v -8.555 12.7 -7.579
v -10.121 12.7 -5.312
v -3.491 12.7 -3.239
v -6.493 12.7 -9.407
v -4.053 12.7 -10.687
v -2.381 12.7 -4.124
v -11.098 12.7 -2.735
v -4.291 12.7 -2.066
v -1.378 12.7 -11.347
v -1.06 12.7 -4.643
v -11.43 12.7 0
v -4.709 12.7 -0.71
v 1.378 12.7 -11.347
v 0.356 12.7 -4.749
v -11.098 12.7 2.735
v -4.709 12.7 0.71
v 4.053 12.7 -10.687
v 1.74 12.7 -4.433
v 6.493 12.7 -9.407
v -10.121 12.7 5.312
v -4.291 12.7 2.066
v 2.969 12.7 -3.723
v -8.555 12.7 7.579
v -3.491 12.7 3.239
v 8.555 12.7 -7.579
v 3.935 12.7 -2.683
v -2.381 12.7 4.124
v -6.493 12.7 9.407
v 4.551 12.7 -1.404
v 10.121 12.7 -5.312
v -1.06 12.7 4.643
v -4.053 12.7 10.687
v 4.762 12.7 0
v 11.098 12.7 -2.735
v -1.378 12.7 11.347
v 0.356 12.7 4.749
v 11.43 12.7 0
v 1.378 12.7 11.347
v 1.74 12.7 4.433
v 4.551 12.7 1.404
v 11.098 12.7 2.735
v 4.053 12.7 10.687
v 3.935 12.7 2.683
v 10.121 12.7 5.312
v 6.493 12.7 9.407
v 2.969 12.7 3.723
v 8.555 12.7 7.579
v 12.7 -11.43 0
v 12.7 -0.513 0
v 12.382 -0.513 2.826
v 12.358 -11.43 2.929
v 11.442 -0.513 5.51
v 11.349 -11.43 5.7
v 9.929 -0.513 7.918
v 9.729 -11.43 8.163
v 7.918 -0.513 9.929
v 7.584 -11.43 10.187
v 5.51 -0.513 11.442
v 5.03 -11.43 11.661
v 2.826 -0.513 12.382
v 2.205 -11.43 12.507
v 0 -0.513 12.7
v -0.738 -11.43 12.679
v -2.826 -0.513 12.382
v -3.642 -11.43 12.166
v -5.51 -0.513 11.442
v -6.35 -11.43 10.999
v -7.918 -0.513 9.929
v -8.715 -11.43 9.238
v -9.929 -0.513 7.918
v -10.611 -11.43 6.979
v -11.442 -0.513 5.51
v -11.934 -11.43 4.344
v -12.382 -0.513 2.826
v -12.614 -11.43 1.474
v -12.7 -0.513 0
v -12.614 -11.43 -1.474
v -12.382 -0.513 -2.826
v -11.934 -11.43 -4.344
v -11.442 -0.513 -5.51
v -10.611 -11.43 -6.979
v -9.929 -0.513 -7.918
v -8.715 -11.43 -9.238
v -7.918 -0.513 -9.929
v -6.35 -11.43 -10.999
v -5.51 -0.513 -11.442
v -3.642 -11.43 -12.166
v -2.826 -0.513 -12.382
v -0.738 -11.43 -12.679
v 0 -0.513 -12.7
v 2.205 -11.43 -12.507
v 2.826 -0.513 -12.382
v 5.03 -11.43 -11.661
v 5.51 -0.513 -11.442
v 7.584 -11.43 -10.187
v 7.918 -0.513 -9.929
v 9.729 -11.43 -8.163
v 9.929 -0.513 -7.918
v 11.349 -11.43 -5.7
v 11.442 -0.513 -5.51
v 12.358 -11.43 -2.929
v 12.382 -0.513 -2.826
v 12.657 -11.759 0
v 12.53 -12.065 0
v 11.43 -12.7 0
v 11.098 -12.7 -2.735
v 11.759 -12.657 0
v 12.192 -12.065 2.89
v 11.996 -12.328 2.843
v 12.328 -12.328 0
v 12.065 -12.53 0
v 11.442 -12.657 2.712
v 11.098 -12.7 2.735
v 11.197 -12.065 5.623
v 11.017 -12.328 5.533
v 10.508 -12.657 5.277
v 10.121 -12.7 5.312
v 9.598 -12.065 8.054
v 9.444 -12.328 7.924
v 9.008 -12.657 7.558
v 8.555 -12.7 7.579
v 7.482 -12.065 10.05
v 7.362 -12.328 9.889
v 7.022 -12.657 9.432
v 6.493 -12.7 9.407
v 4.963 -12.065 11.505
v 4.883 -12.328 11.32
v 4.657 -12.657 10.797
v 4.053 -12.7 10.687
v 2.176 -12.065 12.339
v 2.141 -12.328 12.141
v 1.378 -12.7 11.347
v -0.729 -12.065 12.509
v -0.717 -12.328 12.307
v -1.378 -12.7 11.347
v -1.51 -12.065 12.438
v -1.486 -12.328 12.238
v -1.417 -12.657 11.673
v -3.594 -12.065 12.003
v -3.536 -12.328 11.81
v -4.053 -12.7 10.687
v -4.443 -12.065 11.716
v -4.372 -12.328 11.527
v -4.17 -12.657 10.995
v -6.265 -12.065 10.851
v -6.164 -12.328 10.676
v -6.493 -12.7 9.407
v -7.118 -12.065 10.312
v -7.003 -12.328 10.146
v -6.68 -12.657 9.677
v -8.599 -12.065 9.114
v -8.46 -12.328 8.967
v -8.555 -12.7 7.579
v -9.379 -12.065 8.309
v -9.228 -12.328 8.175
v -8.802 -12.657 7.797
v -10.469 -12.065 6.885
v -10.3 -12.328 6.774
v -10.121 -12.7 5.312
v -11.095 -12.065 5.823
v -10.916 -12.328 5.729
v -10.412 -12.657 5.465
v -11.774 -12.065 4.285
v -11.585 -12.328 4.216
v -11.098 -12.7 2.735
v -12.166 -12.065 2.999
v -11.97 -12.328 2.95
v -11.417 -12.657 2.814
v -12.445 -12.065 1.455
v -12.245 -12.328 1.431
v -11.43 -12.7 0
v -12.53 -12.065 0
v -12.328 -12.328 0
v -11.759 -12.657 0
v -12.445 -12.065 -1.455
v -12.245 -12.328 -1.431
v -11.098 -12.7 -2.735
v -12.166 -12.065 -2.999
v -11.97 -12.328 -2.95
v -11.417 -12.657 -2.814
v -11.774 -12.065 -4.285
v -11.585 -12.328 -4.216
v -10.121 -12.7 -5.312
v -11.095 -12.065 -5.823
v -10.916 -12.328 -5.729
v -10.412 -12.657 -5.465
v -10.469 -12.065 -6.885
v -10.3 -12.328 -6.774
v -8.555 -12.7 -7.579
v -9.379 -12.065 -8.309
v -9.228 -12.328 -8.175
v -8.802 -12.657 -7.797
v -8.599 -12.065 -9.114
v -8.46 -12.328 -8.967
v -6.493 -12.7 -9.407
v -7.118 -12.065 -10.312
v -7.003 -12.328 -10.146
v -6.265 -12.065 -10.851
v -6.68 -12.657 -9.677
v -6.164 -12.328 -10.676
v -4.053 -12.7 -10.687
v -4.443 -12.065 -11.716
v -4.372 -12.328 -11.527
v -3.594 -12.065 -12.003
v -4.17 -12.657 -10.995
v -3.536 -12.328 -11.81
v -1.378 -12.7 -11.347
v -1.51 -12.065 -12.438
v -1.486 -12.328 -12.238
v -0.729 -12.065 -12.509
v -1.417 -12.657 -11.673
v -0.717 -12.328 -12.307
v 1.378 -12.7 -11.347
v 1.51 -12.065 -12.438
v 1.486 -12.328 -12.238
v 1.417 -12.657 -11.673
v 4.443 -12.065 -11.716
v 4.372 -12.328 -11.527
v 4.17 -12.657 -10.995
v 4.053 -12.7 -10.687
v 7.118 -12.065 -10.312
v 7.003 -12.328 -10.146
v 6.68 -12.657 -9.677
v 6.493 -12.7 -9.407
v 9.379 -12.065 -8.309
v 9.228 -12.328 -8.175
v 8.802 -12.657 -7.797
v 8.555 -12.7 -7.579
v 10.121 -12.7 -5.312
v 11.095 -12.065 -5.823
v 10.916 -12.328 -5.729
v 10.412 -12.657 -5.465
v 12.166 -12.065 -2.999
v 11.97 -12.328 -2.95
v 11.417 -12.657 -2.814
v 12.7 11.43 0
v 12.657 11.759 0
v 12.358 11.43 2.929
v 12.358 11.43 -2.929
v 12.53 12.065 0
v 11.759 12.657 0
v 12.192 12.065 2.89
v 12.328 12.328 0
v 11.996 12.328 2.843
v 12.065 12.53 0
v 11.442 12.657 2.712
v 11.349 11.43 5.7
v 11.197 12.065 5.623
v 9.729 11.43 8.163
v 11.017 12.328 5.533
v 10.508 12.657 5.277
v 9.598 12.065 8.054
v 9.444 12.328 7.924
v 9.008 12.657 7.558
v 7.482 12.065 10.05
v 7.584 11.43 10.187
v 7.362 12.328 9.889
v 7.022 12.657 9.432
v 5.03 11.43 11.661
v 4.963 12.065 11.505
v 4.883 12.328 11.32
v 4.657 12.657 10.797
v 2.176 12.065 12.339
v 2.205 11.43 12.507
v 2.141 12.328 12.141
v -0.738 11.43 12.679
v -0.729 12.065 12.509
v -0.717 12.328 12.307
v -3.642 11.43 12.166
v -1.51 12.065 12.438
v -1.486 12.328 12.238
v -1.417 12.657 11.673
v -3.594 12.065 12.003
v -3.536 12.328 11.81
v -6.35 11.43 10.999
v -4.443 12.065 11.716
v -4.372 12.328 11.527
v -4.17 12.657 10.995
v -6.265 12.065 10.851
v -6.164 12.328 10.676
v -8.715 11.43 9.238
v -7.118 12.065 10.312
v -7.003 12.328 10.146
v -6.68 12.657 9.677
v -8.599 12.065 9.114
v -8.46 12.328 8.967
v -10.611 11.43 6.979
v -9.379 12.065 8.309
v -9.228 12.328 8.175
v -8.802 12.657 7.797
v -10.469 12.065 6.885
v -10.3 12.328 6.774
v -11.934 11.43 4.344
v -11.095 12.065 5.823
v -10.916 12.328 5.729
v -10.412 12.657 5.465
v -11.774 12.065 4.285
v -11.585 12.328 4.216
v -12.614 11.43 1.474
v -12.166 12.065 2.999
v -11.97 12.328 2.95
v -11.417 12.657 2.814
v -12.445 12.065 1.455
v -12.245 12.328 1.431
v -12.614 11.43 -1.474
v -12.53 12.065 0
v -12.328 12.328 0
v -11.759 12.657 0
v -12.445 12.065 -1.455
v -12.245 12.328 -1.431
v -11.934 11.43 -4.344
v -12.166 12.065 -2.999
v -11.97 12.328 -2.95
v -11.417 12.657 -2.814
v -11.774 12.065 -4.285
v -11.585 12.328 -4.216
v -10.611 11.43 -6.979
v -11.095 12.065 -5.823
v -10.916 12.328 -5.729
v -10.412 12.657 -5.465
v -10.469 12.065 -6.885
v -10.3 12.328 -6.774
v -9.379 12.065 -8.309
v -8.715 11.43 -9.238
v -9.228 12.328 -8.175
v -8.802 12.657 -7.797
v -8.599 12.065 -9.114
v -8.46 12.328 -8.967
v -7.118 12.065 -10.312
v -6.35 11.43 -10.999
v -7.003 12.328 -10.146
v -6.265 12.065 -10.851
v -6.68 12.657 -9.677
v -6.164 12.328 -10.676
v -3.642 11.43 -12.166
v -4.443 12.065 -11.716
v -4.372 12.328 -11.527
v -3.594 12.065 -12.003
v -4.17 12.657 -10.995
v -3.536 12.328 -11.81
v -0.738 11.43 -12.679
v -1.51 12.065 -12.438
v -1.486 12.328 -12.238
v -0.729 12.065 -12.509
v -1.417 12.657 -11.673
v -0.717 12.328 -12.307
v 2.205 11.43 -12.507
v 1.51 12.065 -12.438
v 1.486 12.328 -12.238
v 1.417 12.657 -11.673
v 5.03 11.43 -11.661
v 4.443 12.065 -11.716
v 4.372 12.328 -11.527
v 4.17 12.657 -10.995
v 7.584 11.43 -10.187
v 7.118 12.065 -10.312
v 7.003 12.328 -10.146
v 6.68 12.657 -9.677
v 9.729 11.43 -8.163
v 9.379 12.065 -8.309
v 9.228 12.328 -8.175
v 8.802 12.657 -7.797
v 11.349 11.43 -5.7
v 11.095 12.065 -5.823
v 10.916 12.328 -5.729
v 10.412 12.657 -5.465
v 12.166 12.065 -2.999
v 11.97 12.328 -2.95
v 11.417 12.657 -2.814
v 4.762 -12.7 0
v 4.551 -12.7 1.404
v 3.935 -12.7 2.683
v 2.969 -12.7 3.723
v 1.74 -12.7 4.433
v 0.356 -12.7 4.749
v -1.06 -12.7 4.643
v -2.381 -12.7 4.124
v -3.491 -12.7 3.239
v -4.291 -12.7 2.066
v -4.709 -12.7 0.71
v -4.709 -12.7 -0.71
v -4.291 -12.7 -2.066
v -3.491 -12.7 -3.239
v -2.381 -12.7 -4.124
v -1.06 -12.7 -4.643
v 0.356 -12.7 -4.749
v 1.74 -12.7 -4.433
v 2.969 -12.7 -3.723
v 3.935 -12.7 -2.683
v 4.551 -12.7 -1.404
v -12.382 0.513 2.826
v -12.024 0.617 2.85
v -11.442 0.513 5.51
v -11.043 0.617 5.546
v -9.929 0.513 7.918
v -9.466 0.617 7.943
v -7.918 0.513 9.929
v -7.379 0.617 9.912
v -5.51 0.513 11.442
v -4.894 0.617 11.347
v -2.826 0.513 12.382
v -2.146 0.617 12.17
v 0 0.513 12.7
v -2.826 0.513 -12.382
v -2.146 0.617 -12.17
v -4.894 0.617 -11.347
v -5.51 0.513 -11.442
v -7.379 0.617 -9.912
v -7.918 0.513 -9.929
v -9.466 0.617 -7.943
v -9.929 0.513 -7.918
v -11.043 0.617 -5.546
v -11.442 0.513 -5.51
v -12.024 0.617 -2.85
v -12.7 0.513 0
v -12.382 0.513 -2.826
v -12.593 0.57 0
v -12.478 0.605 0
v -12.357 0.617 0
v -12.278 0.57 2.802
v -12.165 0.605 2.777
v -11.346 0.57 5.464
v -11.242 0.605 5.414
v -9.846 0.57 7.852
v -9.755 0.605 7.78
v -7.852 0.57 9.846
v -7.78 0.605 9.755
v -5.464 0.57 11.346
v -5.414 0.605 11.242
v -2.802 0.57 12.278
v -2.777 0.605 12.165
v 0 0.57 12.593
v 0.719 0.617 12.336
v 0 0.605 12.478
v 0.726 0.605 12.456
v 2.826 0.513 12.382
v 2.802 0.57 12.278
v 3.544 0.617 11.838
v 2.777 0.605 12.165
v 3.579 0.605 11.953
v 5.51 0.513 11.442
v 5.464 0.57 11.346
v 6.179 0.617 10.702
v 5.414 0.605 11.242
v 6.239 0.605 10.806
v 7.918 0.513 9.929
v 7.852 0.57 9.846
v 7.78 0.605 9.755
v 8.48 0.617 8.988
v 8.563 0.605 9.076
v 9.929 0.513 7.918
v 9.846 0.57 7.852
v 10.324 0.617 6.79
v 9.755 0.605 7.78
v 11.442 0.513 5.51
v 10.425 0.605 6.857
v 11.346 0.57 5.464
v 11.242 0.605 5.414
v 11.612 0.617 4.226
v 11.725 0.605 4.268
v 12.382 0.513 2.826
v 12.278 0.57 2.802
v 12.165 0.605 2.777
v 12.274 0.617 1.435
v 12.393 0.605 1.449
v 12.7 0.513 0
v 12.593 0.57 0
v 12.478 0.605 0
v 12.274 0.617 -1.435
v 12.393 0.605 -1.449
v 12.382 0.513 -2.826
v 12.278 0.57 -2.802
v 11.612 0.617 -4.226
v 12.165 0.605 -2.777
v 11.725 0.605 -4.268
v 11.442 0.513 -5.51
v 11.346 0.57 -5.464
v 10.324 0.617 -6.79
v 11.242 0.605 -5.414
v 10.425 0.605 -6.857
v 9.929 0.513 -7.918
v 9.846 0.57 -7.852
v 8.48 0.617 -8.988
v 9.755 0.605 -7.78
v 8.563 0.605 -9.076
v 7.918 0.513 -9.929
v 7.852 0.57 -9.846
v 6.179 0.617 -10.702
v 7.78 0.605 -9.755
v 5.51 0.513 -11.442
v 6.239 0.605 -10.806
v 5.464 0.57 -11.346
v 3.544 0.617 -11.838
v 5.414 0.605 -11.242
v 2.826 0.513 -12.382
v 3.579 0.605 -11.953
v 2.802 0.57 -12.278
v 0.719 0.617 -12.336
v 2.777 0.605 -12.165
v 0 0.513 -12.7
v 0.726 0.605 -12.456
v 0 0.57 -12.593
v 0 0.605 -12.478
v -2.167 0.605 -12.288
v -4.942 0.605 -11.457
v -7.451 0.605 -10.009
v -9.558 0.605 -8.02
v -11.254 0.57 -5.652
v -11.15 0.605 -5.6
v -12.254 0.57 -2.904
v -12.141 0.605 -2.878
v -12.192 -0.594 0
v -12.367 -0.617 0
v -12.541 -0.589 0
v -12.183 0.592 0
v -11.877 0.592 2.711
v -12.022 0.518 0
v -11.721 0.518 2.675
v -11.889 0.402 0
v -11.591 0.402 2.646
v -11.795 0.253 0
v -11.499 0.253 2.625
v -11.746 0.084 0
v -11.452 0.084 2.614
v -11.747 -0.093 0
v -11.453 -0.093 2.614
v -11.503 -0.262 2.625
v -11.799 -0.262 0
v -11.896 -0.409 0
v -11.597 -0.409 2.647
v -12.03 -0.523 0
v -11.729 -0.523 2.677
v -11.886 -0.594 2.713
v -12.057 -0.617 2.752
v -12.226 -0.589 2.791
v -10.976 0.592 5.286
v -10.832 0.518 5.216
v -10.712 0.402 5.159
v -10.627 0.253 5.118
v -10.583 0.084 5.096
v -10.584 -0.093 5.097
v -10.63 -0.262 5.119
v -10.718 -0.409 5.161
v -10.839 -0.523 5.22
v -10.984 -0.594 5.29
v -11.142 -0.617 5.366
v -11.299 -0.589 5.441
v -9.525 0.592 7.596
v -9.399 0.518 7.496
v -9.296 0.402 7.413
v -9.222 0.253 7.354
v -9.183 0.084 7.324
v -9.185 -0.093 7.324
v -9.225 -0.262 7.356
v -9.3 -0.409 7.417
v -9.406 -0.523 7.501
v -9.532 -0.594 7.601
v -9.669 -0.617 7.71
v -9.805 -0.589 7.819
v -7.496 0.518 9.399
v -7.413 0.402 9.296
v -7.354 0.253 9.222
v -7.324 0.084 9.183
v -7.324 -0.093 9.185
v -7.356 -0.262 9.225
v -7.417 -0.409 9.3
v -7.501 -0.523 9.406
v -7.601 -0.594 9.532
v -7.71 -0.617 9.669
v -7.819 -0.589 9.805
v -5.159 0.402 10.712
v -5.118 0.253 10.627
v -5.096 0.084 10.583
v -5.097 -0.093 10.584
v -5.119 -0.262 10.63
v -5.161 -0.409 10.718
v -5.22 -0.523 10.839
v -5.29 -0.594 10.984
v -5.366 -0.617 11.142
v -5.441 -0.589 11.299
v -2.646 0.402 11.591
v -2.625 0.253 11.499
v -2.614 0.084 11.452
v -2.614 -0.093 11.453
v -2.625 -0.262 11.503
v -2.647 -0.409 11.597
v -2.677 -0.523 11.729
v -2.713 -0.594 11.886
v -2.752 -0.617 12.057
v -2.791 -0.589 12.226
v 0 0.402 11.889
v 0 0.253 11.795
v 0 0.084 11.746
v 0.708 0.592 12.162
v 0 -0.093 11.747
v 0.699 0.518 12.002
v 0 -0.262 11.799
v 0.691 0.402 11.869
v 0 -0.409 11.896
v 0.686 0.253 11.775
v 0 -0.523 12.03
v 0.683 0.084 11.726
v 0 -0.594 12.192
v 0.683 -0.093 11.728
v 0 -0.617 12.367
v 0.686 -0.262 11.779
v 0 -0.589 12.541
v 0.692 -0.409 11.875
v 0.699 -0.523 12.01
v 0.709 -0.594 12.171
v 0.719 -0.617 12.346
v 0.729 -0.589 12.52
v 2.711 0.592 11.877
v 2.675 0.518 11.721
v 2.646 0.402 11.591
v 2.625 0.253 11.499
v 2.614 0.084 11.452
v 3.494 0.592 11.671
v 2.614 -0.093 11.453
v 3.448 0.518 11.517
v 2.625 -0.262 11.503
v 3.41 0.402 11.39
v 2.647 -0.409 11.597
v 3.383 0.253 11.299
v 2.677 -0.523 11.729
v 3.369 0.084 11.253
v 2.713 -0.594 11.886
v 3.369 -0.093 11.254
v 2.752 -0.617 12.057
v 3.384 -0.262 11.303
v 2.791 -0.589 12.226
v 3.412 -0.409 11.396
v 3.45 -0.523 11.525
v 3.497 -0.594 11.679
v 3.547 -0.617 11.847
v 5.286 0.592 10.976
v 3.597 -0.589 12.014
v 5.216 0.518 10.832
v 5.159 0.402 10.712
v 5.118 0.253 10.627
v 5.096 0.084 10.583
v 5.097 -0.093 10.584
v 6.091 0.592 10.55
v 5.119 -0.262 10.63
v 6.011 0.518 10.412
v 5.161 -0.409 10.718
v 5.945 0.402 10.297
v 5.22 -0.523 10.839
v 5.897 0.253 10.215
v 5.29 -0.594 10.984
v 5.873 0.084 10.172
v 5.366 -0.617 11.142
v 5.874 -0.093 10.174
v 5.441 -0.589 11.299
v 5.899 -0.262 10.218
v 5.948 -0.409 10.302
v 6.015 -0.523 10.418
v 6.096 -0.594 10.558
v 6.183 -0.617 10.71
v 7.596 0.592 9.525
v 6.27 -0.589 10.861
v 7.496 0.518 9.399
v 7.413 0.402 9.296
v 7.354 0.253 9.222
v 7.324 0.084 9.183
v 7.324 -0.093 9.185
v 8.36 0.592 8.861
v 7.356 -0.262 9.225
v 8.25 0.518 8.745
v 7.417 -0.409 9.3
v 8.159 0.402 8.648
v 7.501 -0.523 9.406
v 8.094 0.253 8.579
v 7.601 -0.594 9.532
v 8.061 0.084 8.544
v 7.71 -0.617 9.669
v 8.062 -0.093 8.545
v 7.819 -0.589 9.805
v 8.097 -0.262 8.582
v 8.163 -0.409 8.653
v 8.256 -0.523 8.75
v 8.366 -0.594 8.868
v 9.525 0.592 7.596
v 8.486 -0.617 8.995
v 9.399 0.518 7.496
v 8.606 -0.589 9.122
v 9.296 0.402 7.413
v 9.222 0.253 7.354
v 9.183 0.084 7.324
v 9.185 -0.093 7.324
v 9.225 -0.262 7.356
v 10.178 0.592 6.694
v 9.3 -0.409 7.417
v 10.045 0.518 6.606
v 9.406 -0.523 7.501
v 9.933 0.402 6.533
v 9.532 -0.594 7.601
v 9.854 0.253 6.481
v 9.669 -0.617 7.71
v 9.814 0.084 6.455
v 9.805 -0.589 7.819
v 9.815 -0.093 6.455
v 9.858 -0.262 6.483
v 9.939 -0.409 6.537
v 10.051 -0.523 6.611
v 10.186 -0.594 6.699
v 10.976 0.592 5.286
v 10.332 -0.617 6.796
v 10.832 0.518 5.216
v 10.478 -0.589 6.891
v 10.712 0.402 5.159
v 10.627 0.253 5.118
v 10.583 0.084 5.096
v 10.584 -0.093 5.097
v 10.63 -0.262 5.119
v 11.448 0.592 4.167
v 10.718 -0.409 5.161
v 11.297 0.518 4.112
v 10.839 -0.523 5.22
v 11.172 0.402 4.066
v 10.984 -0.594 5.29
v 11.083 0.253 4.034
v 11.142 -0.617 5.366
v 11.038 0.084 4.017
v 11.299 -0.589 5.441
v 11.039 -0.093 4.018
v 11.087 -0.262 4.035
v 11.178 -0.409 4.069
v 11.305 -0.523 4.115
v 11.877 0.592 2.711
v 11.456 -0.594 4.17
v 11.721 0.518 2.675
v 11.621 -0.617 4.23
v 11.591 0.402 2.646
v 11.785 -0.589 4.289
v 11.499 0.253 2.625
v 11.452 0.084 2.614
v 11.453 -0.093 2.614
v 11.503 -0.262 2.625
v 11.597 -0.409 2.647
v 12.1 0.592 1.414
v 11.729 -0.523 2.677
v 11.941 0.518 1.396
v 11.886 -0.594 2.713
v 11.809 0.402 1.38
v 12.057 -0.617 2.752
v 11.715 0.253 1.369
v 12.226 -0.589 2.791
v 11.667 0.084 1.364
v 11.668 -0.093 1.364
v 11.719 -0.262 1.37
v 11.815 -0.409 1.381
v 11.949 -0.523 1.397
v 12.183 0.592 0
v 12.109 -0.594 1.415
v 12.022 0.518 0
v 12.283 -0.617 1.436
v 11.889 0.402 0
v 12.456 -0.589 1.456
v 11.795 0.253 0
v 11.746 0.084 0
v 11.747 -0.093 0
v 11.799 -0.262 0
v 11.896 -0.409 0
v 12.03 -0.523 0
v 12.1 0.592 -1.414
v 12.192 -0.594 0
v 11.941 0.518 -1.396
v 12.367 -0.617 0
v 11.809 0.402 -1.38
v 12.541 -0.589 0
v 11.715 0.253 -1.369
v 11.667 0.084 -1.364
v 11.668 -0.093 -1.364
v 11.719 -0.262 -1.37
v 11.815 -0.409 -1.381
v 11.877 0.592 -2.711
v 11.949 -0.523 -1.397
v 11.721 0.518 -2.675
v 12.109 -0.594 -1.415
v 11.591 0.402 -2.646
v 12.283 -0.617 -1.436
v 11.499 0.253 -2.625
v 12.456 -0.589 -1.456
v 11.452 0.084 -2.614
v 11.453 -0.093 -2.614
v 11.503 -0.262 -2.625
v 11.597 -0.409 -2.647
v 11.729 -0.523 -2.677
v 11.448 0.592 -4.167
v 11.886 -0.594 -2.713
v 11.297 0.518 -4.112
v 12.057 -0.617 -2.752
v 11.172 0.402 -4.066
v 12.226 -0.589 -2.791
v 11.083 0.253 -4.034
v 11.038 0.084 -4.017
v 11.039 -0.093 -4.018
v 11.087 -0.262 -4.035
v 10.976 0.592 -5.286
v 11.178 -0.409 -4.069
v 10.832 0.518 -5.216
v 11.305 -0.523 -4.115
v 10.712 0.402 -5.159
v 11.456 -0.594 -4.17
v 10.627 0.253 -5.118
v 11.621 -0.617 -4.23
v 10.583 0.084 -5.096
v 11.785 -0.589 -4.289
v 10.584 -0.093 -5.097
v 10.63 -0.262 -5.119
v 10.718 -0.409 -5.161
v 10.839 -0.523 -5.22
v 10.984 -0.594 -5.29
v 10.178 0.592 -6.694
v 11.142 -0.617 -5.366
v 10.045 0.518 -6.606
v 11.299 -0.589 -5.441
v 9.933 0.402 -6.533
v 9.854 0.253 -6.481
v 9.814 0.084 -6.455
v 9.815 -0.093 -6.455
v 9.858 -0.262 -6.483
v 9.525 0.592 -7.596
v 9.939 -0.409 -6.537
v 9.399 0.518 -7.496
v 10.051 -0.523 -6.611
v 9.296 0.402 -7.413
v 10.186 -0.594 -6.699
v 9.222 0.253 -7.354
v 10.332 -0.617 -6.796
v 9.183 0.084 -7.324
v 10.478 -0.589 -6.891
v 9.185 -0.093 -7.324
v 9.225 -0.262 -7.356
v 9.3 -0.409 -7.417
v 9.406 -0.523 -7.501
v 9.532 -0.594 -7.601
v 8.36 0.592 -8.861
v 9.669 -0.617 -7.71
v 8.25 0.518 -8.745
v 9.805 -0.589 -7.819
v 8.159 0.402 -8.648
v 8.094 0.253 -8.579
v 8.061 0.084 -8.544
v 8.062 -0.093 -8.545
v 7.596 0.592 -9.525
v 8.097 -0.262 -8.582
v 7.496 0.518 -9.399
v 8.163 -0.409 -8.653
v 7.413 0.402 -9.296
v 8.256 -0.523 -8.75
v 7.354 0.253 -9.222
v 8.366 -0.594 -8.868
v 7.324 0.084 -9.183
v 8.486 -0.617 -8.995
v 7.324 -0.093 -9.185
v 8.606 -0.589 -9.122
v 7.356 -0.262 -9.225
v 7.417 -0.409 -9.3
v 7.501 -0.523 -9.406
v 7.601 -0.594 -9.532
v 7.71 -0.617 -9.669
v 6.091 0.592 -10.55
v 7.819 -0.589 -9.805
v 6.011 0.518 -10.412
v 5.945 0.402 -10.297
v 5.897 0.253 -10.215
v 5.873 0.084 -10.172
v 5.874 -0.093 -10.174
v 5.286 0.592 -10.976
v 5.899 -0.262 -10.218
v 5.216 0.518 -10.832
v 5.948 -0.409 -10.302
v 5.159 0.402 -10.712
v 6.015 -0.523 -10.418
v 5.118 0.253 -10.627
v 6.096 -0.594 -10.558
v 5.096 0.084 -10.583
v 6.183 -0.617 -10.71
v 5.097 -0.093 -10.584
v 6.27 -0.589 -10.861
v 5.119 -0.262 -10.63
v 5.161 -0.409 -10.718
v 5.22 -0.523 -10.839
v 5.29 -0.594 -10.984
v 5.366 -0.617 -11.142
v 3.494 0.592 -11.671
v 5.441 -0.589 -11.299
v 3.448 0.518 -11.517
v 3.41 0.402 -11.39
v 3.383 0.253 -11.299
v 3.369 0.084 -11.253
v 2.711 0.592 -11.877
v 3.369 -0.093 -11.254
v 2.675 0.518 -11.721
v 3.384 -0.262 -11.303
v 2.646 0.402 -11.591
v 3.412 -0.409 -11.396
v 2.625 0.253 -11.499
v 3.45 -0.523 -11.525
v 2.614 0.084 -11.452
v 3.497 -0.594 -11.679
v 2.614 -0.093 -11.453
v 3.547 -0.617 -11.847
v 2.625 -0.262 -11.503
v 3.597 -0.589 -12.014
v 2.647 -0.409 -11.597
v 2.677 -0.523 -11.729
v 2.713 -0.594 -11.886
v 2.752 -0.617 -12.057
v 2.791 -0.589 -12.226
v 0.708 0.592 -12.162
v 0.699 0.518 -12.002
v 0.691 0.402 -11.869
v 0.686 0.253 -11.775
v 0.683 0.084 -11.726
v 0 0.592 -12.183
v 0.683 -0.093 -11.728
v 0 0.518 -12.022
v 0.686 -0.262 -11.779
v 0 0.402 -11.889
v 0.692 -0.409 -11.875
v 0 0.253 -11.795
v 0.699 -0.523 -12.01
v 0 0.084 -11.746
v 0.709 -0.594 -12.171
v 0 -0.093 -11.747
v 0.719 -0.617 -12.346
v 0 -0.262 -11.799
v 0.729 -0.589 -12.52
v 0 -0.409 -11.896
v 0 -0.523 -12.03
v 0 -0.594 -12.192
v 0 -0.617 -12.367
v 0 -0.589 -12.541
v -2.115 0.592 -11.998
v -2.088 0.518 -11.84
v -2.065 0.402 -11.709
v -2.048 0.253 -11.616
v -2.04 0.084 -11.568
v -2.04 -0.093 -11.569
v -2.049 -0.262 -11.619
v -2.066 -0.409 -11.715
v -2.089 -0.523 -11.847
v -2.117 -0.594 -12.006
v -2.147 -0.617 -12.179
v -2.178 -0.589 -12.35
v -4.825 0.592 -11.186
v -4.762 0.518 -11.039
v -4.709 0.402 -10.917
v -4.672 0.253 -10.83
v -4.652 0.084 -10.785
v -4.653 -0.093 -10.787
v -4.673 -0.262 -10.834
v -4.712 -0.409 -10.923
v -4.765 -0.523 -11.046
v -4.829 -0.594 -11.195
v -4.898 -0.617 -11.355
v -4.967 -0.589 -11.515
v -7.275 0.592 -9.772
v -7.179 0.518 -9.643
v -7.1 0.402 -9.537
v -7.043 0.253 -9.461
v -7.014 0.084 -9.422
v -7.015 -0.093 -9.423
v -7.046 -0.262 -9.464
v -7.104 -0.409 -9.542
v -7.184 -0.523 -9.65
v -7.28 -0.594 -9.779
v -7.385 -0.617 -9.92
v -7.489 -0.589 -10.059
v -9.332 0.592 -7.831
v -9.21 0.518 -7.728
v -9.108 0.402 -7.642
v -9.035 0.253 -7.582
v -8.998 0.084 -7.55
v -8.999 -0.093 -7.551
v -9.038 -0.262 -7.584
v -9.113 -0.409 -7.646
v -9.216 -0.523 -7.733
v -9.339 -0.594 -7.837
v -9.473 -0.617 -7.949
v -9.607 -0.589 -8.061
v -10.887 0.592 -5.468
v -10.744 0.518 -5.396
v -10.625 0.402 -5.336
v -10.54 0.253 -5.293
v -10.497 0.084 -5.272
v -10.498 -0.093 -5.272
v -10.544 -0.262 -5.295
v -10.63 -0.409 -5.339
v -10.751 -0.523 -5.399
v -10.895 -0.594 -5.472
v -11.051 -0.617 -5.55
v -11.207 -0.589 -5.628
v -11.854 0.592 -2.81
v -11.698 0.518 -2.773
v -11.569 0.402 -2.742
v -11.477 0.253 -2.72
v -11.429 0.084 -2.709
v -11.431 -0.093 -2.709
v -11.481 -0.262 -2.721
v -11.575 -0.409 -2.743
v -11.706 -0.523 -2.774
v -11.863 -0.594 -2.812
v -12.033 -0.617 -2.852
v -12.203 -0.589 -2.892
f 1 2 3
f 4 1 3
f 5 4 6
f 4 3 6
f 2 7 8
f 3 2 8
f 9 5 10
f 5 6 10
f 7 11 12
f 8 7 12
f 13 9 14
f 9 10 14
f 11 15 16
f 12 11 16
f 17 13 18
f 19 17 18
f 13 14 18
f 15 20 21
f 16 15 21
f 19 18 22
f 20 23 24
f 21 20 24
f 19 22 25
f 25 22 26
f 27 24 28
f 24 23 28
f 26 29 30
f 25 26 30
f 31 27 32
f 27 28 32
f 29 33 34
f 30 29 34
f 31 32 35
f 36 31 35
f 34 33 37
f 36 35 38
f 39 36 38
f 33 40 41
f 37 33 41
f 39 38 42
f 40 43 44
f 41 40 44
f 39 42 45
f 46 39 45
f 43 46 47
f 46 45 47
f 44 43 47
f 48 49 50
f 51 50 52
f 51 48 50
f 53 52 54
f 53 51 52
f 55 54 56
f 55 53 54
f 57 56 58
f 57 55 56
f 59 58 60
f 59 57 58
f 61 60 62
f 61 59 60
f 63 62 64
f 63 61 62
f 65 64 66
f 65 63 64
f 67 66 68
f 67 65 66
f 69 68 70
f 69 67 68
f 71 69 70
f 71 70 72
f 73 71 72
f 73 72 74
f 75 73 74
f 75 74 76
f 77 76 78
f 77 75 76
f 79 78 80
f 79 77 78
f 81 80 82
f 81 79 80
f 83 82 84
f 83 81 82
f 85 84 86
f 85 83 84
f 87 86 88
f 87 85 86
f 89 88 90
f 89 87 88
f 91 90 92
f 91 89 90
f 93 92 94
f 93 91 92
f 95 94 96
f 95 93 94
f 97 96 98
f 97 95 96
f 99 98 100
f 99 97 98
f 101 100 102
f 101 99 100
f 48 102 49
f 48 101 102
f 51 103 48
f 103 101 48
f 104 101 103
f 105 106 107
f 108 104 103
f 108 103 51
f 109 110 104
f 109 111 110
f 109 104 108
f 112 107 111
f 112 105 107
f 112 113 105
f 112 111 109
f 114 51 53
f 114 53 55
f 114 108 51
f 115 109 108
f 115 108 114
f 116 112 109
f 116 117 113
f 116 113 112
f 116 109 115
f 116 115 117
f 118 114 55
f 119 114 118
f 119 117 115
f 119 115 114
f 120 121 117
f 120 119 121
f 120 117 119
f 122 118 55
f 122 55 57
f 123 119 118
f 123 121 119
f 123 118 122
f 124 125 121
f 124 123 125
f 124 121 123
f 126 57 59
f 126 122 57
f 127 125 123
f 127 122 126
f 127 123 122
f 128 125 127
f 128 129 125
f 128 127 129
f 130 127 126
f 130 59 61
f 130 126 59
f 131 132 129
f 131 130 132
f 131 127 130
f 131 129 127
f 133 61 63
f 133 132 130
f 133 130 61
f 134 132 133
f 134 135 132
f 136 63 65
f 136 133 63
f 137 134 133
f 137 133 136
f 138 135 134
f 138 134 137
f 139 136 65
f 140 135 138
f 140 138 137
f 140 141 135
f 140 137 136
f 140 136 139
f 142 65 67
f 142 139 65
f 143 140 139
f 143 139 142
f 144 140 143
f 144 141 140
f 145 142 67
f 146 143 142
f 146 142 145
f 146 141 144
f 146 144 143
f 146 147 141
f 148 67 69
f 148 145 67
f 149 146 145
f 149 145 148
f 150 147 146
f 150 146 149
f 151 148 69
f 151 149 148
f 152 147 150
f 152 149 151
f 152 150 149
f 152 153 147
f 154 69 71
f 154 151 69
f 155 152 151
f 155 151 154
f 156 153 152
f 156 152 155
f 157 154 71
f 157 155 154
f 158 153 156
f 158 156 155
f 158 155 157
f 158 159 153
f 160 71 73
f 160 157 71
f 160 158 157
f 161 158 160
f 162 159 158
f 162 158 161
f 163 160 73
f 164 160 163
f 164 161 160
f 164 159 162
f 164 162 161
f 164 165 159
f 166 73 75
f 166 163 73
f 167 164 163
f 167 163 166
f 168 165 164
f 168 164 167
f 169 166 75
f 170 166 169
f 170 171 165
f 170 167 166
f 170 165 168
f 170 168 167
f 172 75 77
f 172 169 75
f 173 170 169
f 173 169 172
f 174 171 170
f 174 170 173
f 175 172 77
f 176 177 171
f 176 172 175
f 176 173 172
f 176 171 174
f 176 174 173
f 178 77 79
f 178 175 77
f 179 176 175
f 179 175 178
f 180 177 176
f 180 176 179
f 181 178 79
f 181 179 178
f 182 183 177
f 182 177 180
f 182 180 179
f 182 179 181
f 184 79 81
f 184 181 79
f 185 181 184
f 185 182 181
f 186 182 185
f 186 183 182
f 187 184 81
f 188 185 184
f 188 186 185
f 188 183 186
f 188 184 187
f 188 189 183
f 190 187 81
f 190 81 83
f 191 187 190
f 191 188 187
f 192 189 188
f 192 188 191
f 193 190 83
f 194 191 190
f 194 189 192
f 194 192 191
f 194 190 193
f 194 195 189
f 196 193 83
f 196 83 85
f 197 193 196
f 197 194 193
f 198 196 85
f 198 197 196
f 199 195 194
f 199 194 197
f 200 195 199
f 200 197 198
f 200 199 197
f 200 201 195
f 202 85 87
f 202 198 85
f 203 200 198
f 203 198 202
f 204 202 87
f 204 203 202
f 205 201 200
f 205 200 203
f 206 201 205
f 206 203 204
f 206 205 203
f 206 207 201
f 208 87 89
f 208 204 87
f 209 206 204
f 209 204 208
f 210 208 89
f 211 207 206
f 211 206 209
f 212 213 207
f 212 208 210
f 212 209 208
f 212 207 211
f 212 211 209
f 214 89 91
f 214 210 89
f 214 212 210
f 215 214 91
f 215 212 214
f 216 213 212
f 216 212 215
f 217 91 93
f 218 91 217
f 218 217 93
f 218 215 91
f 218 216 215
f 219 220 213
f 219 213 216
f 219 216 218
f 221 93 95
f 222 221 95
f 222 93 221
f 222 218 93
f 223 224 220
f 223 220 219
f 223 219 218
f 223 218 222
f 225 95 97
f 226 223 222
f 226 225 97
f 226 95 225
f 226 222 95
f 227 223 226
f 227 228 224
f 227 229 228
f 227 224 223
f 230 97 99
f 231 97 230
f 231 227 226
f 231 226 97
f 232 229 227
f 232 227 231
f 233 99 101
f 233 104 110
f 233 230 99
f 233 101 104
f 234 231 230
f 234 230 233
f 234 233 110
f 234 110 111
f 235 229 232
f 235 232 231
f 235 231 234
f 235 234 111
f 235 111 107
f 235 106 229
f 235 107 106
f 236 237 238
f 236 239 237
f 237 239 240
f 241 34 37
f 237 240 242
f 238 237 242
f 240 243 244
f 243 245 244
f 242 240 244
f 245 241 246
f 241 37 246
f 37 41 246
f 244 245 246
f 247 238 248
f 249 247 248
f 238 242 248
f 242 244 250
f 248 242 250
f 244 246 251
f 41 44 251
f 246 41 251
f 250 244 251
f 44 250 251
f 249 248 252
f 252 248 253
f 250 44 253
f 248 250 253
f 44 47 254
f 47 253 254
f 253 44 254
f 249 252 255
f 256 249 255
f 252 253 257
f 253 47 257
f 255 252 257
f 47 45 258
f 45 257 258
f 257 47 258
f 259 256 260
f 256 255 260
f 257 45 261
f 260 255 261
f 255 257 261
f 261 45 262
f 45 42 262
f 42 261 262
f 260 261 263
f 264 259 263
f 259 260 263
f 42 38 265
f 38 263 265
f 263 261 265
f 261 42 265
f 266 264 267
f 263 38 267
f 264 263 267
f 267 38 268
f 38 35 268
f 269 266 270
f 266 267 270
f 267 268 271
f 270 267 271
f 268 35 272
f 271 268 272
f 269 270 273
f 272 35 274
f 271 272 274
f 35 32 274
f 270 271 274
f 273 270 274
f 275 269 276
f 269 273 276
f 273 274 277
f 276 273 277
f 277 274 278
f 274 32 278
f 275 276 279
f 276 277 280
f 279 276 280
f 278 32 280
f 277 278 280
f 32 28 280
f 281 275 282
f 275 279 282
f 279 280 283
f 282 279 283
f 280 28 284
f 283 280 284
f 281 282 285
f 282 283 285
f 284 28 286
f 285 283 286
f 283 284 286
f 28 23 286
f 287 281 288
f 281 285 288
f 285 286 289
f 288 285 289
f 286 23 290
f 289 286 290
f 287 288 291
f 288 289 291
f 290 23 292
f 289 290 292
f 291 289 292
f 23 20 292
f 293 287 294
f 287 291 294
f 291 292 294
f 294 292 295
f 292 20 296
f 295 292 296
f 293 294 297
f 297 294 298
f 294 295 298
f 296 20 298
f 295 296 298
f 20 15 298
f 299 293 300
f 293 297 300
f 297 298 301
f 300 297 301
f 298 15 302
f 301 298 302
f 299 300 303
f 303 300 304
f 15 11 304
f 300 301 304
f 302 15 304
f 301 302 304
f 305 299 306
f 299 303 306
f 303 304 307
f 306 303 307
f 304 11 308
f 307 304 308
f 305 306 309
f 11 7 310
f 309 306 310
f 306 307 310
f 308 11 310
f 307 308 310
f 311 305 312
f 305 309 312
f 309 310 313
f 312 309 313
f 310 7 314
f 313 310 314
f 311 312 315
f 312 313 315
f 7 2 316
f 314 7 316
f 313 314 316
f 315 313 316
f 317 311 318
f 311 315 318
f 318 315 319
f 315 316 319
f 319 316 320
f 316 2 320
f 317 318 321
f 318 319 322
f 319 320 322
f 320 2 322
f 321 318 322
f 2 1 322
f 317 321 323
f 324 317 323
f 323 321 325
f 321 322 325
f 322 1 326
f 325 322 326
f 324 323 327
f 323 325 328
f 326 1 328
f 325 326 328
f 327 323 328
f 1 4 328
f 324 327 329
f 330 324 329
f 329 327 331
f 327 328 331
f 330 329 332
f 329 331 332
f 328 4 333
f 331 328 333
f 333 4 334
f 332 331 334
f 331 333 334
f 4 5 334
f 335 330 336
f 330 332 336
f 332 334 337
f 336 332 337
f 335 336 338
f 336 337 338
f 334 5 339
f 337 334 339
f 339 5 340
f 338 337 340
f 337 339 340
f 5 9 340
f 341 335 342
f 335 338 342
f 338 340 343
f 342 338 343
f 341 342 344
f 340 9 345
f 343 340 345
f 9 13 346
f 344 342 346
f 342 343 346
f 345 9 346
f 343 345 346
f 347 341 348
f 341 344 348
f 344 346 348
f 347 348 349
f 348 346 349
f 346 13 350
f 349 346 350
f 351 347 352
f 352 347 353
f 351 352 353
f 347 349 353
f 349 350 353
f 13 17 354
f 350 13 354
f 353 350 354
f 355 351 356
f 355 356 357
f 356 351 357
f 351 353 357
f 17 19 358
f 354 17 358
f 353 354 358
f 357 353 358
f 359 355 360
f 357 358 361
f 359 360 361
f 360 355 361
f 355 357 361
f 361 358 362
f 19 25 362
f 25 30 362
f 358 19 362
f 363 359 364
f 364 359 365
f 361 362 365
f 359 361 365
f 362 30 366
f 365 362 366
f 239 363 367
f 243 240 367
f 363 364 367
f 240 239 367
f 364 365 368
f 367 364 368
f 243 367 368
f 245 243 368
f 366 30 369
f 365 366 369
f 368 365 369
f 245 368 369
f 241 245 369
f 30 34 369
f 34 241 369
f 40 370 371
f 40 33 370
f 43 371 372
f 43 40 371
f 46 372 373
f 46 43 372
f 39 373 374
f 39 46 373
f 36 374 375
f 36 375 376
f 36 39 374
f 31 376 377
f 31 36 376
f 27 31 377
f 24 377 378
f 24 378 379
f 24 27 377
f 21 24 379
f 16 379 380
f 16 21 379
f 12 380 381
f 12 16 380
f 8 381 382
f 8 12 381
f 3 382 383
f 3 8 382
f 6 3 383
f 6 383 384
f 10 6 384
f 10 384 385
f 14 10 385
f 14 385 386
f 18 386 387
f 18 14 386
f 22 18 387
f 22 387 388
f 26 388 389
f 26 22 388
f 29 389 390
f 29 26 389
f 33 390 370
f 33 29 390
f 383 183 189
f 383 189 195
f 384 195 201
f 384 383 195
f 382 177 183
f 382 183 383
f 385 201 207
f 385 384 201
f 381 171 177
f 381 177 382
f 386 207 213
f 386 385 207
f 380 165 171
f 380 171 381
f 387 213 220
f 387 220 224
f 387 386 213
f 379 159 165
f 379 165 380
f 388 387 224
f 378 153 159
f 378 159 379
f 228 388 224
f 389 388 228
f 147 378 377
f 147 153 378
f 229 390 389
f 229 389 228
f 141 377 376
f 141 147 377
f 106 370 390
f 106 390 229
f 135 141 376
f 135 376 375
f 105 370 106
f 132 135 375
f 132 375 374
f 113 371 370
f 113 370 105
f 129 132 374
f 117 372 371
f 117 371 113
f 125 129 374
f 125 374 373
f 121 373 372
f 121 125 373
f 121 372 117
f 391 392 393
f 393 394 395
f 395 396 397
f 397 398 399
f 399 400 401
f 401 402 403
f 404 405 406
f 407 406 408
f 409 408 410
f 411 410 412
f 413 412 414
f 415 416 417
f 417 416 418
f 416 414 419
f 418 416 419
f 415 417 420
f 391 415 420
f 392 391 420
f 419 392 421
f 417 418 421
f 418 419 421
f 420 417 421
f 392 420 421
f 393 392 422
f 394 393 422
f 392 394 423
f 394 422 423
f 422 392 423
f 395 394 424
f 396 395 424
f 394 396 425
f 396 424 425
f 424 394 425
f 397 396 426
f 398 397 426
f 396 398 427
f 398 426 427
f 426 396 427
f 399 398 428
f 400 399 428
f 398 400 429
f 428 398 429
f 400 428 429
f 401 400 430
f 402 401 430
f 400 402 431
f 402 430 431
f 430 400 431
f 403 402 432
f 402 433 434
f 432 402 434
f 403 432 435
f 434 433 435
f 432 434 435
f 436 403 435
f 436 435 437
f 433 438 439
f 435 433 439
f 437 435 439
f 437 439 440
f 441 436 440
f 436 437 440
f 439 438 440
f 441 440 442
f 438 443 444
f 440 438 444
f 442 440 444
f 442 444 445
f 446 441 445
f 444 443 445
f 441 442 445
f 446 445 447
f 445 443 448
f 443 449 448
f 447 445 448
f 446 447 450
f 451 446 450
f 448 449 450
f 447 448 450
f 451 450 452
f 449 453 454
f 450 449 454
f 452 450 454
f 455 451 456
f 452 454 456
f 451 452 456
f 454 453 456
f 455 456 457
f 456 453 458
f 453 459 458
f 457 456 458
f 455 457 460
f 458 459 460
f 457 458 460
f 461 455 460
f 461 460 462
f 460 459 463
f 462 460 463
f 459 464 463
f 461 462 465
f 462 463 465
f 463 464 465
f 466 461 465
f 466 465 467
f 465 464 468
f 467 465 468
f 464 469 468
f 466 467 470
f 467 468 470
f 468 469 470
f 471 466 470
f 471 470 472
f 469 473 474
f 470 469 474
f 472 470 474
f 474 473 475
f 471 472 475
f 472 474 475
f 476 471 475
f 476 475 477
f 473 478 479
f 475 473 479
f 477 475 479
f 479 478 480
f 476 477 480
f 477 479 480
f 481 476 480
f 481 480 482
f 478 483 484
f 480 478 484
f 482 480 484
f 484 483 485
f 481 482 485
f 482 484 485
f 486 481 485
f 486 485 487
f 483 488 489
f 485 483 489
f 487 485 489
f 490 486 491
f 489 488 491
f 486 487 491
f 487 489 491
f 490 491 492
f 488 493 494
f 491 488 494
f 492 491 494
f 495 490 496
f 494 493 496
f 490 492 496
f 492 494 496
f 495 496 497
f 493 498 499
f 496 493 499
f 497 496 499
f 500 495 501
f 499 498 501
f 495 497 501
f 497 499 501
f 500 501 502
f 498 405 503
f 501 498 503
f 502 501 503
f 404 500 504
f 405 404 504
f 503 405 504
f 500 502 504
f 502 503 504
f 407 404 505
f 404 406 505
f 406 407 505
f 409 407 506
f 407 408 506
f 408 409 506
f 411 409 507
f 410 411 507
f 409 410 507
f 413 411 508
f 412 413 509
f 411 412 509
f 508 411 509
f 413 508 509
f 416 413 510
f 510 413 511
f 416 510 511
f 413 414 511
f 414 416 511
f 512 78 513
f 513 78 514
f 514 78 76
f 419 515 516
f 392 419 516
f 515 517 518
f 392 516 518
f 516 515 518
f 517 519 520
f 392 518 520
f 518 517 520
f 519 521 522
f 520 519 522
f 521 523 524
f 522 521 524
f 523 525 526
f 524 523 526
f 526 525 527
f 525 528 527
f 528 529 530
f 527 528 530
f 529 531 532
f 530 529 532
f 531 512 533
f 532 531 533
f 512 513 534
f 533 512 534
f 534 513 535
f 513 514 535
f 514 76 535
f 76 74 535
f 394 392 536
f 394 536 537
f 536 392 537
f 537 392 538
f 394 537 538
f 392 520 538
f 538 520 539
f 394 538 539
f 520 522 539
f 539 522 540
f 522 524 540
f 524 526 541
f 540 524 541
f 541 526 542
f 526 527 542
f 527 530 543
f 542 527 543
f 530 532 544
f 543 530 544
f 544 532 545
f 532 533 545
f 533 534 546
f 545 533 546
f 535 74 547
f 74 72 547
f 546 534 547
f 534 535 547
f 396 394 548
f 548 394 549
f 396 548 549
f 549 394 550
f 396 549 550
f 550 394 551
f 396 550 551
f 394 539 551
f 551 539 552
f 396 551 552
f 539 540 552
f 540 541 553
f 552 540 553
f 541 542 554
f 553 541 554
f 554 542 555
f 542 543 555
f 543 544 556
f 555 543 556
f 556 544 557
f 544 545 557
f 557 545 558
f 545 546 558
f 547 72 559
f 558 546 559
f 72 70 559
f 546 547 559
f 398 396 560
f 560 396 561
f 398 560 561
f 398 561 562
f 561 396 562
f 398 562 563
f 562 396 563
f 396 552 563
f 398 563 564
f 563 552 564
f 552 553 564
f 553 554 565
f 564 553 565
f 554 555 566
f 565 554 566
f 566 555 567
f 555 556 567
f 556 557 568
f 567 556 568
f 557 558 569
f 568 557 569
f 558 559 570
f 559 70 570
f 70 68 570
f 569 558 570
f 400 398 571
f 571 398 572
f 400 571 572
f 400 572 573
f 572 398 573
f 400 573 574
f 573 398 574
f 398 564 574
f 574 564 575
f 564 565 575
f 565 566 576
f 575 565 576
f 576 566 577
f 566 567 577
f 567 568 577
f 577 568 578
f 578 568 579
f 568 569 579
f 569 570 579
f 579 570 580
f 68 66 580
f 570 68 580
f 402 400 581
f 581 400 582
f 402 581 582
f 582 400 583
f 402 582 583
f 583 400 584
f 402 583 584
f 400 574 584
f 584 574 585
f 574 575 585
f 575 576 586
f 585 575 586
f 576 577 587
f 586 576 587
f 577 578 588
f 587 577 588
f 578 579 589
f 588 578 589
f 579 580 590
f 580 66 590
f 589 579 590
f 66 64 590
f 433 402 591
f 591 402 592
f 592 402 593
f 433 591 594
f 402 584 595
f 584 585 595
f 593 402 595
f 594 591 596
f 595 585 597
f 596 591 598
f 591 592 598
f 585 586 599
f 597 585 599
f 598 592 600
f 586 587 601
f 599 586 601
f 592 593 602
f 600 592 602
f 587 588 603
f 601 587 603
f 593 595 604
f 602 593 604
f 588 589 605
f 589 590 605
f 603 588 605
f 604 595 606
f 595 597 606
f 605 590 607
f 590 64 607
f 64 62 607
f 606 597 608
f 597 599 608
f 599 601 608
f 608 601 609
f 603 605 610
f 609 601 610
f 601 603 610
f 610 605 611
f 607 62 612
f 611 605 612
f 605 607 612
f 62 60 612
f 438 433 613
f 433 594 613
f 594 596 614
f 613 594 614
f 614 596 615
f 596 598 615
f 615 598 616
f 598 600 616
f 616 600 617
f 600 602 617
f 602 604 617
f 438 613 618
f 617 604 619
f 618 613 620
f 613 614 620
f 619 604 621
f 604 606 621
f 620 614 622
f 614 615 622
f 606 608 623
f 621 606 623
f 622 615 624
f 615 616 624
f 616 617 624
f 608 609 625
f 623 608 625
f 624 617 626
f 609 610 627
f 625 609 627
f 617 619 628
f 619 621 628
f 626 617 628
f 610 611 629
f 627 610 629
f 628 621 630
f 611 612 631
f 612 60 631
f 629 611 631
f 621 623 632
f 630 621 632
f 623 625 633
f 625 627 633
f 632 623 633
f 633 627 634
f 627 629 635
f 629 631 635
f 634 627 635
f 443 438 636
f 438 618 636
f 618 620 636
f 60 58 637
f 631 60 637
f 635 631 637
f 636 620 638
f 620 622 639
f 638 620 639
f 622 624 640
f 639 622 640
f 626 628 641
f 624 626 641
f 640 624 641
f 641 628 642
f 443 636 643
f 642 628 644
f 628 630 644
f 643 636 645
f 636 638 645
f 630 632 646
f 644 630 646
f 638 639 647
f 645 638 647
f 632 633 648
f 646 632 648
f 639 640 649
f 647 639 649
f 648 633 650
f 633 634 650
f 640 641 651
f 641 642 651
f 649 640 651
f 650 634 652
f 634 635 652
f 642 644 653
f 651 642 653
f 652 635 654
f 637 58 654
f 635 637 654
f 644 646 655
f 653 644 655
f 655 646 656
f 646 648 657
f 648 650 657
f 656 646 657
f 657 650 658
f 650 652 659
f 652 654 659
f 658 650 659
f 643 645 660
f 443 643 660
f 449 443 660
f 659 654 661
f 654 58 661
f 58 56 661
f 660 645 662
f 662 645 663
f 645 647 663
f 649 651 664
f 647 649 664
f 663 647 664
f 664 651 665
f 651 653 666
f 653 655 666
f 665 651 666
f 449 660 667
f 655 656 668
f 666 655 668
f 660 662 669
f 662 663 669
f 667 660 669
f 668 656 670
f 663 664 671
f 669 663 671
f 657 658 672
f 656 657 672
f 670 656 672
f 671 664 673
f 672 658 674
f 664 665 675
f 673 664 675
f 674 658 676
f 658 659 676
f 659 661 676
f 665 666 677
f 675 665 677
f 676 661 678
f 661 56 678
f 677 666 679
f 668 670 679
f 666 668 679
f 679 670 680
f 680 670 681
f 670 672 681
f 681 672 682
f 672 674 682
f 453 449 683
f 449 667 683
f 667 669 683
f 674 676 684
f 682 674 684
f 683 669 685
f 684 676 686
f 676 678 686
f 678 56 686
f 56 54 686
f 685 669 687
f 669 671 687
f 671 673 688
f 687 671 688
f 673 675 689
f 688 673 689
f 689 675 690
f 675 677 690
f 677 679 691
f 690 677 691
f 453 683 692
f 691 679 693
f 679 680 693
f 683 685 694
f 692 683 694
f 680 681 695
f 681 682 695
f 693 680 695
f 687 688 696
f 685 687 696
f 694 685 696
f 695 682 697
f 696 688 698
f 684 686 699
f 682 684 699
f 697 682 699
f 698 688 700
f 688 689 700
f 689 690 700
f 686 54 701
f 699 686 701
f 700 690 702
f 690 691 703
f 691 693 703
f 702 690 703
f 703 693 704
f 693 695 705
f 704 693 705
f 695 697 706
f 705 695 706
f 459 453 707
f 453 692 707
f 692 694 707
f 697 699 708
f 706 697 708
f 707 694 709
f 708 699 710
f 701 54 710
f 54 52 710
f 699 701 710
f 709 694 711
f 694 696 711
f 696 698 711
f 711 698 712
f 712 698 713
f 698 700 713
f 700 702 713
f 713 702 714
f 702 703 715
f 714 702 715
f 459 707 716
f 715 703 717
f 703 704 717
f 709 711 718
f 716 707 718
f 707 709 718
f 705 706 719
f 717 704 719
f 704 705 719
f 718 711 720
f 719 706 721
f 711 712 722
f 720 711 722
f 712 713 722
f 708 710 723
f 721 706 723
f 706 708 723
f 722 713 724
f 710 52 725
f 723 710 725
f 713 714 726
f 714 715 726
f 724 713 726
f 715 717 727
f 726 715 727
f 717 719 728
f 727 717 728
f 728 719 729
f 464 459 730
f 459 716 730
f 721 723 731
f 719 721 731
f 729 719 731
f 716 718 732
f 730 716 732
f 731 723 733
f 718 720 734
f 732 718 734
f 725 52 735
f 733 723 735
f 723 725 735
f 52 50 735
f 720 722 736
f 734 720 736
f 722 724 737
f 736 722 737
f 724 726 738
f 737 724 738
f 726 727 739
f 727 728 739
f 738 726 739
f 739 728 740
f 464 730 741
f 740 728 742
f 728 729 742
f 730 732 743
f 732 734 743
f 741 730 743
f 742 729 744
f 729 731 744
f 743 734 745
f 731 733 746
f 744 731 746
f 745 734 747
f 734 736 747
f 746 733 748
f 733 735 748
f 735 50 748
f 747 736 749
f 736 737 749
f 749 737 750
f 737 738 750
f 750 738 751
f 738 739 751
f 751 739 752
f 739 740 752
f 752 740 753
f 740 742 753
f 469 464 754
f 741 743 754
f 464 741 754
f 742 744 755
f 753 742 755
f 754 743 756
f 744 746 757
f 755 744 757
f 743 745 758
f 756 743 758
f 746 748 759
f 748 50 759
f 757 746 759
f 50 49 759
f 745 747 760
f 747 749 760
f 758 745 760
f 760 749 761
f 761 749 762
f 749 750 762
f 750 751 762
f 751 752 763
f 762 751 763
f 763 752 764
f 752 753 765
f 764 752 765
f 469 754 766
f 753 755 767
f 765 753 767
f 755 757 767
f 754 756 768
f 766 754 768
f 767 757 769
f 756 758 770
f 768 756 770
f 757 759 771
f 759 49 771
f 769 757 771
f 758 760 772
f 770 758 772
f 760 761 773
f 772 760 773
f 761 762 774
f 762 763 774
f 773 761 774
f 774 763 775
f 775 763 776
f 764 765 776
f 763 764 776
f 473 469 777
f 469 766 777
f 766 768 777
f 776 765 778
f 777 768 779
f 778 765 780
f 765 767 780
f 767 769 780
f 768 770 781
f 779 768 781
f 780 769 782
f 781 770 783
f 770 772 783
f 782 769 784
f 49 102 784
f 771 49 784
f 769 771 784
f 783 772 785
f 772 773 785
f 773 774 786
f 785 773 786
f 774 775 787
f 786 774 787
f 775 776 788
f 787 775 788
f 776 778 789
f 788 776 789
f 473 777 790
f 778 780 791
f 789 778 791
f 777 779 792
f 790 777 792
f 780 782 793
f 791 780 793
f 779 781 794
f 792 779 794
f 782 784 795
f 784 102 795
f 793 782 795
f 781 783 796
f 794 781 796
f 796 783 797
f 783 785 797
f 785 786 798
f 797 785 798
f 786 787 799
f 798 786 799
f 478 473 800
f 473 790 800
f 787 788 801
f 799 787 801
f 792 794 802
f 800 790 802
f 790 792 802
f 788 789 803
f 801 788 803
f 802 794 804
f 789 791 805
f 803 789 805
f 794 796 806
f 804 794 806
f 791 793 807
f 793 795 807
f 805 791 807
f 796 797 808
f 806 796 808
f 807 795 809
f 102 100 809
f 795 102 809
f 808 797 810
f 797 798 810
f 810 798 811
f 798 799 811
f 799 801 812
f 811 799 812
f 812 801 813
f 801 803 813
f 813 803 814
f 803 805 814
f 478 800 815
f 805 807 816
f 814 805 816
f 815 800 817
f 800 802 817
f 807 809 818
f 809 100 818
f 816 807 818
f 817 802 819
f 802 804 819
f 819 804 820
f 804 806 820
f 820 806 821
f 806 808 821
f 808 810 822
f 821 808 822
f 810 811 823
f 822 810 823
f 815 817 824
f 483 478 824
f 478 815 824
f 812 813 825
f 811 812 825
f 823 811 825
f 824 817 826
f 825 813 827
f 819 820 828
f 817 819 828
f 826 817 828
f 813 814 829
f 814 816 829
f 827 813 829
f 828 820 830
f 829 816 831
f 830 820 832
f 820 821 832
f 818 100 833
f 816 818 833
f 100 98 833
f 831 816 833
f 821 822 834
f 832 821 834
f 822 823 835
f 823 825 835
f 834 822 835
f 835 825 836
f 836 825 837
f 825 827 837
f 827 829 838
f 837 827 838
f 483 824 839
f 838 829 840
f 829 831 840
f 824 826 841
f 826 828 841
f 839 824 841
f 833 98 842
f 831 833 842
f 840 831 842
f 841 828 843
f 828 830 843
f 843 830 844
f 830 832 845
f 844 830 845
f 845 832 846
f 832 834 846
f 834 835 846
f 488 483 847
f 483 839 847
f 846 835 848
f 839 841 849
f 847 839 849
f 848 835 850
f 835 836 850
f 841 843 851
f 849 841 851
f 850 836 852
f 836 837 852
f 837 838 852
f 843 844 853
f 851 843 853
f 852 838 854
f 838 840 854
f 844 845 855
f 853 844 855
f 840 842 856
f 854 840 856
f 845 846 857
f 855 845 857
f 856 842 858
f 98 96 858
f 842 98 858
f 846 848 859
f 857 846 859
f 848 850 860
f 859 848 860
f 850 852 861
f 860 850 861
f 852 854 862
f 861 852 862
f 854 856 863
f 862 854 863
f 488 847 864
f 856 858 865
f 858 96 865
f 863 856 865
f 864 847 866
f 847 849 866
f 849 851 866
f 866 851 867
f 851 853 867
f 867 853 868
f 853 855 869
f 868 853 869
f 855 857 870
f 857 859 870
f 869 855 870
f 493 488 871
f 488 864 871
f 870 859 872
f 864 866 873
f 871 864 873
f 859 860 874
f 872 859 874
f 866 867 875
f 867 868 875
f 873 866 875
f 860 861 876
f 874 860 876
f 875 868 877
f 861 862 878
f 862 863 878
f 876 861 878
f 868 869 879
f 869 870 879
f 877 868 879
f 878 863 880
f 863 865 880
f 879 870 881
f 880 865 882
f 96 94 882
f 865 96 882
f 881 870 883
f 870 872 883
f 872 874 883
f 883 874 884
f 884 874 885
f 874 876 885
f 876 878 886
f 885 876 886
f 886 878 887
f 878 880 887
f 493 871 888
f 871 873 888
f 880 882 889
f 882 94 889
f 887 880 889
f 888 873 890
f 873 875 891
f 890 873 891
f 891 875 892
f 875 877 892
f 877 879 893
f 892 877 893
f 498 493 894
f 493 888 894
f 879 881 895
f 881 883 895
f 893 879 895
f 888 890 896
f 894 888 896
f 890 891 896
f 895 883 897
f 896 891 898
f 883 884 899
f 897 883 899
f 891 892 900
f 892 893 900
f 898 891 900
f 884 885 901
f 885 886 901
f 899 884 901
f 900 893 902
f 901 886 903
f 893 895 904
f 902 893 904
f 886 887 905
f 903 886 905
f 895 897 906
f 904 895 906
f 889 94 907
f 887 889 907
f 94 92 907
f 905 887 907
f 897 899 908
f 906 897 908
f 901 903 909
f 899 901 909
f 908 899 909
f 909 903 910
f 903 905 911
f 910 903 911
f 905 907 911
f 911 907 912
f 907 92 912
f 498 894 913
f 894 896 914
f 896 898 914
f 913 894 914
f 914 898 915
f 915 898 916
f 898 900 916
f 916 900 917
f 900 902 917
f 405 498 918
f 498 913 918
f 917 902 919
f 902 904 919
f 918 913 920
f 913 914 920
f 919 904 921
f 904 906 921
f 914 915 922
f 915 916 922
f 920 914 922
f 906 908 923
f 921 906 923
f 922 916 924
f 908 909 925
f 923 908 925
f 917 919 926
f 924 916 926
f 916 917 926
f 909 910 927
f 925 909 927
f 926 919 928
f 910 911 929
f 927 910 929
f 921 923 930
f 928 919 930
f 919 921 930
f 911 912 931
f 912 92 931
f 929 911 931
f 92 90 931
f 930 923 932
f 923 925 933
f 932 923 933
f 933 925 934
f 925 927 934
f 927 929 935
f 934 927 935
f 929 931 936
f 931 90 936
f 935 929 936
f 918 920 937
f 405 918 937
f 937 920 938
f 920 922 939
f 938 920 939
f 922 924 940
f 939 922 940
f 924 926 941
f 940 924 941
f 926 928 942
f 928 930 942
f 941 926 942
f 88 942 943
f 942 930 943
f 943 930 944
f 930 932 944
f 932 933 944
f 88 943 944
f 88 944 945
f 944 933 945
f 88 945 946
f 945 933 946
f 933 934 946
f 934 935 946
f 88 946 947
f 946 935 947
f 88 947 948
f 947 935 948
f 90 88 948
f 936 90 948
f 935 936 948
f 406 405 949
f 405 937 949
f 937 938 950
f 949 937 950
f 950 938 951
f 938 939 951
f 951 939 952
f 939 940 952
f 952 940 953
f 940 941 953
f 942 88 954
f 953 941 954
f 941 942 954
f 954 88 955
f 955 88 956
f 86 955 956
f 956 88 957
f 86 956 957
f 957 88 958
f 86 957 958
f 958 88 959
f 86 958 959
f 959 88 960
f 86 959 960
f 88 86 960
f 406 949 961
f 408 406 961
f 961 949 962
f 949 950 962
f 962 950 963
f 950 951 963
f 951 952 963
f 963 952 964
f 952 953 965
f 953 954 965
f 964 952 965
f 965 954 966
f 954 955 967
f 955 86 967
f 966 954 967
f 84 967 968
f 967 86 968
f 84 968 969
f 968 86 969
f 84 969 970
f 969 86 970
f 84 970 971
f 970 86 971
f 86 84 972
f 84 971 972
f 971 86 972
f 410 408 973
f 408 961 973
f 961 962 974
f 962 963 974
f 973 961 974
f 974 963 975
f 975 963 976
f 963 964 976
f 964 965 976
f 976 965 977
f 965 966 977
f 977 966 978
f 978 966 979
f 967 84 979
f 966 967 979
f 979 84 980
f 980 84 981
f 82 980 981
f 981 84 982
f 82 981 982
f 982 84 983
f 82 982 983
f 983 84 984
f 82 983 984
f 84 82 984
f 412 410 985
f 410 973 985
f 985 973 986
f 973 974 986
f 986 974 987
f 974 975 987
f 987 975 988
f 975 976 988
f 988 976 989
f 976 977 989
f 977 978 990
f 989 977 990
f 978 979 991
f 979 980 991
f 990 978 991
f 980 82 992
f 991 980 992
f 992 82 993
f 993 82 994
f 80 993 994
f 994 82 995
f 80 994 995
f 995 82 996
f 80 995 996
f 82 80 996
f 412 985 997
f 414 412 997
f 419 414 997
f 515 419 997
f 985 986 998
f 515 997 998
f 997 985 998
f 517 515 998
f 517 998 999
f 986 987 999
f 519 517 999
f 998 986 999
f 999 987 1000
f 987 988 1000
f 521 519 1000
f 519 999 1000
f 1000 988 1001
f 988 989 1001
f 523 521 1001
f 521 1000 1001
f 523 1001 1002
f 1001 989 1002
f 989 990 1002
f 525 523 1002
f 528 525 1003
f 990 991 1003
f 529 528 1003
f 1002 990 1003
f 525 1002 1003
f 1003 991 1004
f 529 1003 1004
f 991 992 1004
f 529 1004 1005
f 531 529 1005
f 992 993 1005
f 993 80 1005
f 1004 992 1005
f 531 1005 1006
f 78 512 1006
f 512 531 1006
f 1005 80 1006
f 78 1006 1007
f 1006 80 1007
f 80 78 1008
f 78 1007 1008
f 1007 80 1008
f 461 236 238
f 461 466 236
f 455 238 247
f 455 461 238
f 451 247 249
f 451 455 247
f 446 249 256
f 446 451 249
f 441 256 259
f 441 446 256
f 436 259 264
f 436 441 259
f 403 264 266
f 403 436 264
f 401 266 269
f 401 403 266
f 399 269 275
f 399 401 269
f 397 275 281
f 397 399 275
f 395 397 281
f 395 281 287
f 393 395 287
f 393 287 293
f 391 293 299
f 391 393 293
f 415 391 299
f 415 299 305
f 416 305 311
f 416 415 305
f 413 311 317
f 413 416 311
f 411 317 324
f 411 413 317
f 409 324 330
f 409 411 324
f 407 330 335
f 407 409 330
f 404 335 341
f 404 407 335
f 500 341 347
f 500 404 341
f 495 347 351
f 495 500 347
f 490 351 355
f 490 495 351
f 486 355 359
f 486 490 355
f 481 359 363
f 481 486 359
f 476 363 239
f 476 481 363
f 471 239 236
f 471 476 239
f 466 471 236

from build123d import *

# Parameters (mm, degrees)
F0_R     = 12.7
F0_R_2   = 4.7625
F1_DEPTH = 12.7
F3_R     = 1.27
F6_R     = 0.6168431606


with BuildPart() as f1:
    # F0 (on Front) → F1 (new body, symmetric)
    with BuildSketch(Plane.XZ):
        Circle(F0_R)
        Circle(F0_R_2, mode=Mode.SUBTRACT)
    extrude(amount=F1_DEPTH, both=True)

    # F3
    f3_edges = [f1.edges().sort_by_distance(p)[0] for p in [
        (-12.7, 12.7, 0),
        (-12.7, -12.7, 0),
    ]]
    fillet(f3_edges, radius=F3_R)

    # F7: sweep along a path in F4
    with BuildLine(Plane(origin=(0, 0, 0), x_dir=(-1, 0, 0), z_dir=(0, 1, 0))) as f7_path:
        CenterArc((0, 0), 12.319, 0, 360)
    # F6 (on line) → F7 (sweep, cut)
    with BuildSketch(Plane.YZ):
        with Locations((0, 12.3572489247)):
            Circle(F6_R)
    sweep(path=f7_path.line, mode=Mode.SUBTRACT)


solid = f1.part
